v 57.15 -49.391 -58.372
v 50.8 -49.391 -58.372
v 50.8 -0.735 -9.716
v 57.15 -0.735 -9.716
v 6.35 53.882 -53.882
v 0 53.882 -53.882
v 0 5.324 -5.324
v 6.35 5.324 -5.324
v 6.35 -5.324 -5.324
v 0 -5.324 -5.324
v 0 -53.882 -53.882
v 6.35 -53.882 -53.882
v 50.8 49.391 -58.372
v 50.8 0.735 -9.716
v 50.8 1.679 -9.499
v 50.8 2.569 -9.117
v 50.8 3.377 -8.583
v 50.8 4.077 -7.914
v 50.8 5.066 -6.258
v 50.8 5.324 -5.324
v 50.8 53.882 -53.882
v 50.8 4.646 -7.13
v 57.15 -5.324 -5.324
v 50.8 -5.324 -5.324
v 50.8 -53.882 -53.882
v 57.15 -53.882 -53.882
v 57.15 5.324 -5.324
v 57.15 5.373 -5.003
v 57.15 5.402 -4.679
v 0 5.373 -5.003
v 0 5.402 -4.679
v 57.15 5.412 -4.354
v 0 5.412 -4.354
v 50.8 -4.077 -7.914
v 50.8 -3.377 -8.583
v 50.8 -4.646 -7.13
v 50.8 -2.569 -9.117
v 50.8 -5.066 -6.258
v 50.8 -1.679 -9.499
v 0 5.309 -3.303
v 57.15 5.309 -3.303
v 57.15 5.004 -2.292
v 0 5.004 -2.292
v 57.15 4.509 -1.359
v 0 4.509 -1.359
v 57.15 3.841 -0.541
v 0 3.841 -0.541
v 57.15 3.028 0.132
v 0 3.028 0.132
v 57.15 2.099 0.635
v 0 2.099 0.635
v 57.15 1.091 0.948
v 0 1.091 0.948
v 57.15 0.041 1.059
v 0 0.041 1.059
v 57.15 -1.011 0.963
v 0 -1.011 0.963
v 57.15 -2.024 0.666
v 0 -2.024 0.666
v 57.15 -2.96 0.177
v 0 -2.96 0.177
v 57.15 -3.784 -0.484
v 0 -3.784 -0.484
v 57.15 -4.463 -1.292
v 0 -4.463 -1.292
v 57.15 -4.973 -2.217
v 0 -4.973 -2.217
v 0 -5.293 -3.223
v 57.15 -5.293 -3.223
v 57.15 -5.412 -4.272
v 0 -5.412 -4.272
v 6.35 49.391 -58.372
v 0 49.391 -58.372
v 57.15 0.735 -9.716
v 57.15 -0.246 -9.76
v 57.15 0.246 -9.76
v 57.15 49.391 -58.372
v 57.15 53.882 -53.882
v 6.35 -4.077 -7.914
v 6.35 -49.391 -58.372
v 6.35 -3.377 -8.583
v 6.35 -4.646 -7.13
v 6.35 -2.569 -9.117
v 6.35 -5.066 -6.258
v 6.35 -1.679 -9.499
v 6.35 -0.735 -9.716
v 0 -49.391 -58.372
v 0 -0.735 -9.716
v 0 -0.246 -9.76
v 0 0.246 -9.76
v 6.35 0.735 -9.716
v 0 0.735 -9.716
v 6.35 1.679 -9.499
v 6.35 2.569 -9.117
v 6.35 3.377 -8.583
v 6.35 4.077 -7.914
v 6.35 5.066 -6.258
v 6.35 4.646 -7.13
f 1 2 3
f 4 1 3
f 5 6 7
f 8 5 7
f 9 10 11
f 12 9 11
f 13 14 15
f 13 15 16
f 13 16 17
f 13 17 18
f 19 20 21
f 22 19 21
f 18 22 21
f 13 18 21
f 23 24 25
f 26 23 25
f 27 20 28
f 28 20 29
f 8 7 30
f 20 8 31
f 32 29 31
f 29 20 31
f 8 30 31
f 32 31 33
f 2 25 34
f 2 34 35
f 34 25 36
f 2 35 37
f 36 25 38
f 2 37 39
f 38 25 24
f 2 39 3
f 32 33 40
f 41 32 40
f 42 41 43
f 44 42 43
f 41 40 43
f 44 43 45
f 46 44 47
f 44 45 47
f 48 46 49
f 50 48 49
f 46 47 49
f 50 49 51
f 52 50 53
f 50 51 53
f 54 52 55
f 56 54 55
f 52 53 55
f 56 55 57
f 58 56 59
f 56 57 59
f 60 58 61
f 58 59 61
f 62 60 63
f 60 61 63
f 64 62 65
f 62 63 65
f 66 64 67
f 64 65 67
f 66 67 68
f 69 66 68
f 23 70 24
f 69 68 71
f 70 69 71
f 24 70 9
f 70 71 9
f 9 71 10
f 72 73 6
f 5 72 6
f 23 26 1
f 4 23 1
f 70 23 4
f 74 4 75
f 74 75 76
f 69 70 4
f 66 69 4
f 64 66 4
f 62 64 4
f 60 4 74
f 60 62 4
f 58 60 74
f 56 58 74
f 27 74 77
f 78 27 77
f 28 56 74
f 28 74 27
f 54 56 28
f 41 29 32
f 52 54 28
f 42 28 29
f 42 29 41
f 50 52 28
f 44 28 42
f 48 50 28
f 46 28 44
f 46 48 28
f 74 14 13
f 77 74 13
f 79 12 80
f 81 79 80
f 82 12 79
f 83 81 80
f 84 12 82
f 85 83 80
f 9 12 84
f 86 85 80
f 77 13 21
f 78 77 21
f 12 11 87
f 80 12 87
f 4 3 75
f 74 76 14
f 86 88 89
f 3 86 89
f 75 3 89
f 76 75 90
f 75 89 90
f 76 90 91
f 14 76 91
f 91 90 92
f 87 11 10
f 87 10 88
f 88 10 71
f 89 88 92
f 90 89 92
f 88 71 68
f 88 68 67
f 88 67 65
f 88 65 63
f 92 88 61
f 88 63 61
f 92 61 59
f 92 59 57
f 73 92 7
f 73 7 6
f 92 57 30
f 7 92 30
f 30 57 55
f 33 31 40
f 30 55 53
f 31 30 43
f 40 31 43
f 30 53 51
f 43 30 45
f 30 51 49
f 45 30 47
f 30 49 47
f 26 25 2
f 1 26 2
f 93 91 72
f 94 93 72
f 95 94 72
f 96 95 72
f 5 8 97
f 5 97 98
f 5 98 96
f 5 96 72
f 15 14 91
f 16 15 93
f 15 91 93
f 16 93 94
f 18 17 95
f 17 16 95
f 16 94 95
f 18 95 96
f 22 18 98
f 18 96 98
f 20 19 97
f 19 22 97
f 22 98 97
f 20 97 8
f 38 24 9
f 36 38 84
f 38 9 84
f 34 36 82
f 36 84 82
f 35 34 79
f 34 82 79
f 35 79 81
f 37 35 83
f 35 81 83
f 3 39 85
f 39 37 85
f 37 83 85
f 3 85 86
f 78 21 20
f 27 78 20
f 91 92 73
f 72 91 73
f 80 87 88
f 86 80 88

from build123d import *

# Parameters (mm, degrees)
F1_DEPTH = 6.35
F2_START = 50.8
F2_DEPTH = 6.35
F3_DEPTH = 57.15


with BuildPart() as f1:
    # F0 (on Right) → F1 (new body)
    with BuildSketch(Plane.YZ):
        with BuildLine():
            Line((-49.3914086659, -58.3716647869), (-0.7353354825, -9.7155916035))
            ThreePointArc((-0.7353354825, -9.7155916035), (-3.7417609774, -8.2639811349), (-5.3244428604, -5.3244428604))
            Line((-5.3244428604, -5.3244428604), (-53.8815367264, -53.8815367264))
            Line((-53.8815367264, -53.8815367264), (-49.3914086659, -58.3716647869))
        make_face()
    extrude(amount=F1_DEPTH)



with BuildPart() as f1b:
    # F0 (on Right) → F1, piece 2 (new body)
    with BuildSketch(Plane.YZ):
        with BuildLine():
            Line((53.8815367264, -53.8815367264), (5.3244428604, -5.3244428604))
            ThreePointArc((5.3244428604, -5.3244428604), (3.7417609774, -8.2639811349), (0.7353354825, -9.7155916035))
            Line((0.7353354825, -9.7155916035), (49.3914086659, -58.3716647869))
            Line((49.3914086659, -58.3716647869), (53.8815367264, -53.8815367264))
        make_face()
    extrude(amount=F1_DEPTH)


with BuildPart() as f2:
    # F0 (on Right) → F2 (new body)
    with BuildSketch(Plane.YZ.offset(F2_START)):
        with BuildLine():
            Line((-49.3914086659, -58.3716647869), (-0.7353354825, -9.7155916035))
            ThreePointArc((-0.7353354825, -9.7155916035), (-3.7417609774, -8.2639811349), (-5.3244428604, -5.3244428604))
            Line((-5.3244428604, -5.3244428604), (-53.8815367264, -53.8815367264))
            Line((-53.8815367264, -53.8815367264), (-49.3914086659, -58.3716647869))
        make_face()
    extrude(amount=F2_DEPTH)


with BuildPart() as f2b:
    # F0 (on Right) → F2, piece 2 (new body)
    with BuildSketch(Plane.YZ.offset(F2_START)):
        with BuildLine():
            Line((53.8815367264, -53.8815367264), (5.3244428604, -5.3244428604))
            ThreePointArc((5.3244428604, -5.3244428604), (3.7417609774, -8.2639811349), (0.7353354825, -9.7155916035))
            Line((0.7353354825, -9.7155916035), (49.3914086659, -58.3716647869))
            Line((49.3914086659, -58.3716647869), (53.8815367264, -53.8815367264))
        make_face()
    extrude(amount=F2_DEPTH)


with BuildPart() as f1_1:
    add(f1.part)

    add(f1b.part)  # F3 merges F1b

    add(f2.part)  # F3 merges F2

    add(f2b.part)  # F3 merges F2b
    # F0 (on Right) → F3 (join)
    with BuildSketch(Plane.YZ):
        with BuildLine():
            ThreePointArc((0.7353354825, -9.7155916035), (3.7417609774, -8.2639811349), (5.3244428604, -5.3244428604))
            ThreePointArc((5.3244428604, -5.3244428604), (5.3902466222, -4.8409706351), (5.4122407959, -4.3535367586))
            ThreePointArc((5.4122407959, -4.3535367586), (-0.4874338766, 1.0367098636), (-5.3244428604, -5.3244428604))
            ThreePointArc((-5.3244428604, -5.3244428604), (-3.7417609774, -8.2639811349), (-0.7353354825, -9.7155916035))
            ThreePointArc((-0.7353354825, -9.7155916035), (0, -9.7657775544), (0.7353354825, -9.7155916035))
        make_face()
    extrude(amount=F3_DEPTH)


solid = f1_1.part
